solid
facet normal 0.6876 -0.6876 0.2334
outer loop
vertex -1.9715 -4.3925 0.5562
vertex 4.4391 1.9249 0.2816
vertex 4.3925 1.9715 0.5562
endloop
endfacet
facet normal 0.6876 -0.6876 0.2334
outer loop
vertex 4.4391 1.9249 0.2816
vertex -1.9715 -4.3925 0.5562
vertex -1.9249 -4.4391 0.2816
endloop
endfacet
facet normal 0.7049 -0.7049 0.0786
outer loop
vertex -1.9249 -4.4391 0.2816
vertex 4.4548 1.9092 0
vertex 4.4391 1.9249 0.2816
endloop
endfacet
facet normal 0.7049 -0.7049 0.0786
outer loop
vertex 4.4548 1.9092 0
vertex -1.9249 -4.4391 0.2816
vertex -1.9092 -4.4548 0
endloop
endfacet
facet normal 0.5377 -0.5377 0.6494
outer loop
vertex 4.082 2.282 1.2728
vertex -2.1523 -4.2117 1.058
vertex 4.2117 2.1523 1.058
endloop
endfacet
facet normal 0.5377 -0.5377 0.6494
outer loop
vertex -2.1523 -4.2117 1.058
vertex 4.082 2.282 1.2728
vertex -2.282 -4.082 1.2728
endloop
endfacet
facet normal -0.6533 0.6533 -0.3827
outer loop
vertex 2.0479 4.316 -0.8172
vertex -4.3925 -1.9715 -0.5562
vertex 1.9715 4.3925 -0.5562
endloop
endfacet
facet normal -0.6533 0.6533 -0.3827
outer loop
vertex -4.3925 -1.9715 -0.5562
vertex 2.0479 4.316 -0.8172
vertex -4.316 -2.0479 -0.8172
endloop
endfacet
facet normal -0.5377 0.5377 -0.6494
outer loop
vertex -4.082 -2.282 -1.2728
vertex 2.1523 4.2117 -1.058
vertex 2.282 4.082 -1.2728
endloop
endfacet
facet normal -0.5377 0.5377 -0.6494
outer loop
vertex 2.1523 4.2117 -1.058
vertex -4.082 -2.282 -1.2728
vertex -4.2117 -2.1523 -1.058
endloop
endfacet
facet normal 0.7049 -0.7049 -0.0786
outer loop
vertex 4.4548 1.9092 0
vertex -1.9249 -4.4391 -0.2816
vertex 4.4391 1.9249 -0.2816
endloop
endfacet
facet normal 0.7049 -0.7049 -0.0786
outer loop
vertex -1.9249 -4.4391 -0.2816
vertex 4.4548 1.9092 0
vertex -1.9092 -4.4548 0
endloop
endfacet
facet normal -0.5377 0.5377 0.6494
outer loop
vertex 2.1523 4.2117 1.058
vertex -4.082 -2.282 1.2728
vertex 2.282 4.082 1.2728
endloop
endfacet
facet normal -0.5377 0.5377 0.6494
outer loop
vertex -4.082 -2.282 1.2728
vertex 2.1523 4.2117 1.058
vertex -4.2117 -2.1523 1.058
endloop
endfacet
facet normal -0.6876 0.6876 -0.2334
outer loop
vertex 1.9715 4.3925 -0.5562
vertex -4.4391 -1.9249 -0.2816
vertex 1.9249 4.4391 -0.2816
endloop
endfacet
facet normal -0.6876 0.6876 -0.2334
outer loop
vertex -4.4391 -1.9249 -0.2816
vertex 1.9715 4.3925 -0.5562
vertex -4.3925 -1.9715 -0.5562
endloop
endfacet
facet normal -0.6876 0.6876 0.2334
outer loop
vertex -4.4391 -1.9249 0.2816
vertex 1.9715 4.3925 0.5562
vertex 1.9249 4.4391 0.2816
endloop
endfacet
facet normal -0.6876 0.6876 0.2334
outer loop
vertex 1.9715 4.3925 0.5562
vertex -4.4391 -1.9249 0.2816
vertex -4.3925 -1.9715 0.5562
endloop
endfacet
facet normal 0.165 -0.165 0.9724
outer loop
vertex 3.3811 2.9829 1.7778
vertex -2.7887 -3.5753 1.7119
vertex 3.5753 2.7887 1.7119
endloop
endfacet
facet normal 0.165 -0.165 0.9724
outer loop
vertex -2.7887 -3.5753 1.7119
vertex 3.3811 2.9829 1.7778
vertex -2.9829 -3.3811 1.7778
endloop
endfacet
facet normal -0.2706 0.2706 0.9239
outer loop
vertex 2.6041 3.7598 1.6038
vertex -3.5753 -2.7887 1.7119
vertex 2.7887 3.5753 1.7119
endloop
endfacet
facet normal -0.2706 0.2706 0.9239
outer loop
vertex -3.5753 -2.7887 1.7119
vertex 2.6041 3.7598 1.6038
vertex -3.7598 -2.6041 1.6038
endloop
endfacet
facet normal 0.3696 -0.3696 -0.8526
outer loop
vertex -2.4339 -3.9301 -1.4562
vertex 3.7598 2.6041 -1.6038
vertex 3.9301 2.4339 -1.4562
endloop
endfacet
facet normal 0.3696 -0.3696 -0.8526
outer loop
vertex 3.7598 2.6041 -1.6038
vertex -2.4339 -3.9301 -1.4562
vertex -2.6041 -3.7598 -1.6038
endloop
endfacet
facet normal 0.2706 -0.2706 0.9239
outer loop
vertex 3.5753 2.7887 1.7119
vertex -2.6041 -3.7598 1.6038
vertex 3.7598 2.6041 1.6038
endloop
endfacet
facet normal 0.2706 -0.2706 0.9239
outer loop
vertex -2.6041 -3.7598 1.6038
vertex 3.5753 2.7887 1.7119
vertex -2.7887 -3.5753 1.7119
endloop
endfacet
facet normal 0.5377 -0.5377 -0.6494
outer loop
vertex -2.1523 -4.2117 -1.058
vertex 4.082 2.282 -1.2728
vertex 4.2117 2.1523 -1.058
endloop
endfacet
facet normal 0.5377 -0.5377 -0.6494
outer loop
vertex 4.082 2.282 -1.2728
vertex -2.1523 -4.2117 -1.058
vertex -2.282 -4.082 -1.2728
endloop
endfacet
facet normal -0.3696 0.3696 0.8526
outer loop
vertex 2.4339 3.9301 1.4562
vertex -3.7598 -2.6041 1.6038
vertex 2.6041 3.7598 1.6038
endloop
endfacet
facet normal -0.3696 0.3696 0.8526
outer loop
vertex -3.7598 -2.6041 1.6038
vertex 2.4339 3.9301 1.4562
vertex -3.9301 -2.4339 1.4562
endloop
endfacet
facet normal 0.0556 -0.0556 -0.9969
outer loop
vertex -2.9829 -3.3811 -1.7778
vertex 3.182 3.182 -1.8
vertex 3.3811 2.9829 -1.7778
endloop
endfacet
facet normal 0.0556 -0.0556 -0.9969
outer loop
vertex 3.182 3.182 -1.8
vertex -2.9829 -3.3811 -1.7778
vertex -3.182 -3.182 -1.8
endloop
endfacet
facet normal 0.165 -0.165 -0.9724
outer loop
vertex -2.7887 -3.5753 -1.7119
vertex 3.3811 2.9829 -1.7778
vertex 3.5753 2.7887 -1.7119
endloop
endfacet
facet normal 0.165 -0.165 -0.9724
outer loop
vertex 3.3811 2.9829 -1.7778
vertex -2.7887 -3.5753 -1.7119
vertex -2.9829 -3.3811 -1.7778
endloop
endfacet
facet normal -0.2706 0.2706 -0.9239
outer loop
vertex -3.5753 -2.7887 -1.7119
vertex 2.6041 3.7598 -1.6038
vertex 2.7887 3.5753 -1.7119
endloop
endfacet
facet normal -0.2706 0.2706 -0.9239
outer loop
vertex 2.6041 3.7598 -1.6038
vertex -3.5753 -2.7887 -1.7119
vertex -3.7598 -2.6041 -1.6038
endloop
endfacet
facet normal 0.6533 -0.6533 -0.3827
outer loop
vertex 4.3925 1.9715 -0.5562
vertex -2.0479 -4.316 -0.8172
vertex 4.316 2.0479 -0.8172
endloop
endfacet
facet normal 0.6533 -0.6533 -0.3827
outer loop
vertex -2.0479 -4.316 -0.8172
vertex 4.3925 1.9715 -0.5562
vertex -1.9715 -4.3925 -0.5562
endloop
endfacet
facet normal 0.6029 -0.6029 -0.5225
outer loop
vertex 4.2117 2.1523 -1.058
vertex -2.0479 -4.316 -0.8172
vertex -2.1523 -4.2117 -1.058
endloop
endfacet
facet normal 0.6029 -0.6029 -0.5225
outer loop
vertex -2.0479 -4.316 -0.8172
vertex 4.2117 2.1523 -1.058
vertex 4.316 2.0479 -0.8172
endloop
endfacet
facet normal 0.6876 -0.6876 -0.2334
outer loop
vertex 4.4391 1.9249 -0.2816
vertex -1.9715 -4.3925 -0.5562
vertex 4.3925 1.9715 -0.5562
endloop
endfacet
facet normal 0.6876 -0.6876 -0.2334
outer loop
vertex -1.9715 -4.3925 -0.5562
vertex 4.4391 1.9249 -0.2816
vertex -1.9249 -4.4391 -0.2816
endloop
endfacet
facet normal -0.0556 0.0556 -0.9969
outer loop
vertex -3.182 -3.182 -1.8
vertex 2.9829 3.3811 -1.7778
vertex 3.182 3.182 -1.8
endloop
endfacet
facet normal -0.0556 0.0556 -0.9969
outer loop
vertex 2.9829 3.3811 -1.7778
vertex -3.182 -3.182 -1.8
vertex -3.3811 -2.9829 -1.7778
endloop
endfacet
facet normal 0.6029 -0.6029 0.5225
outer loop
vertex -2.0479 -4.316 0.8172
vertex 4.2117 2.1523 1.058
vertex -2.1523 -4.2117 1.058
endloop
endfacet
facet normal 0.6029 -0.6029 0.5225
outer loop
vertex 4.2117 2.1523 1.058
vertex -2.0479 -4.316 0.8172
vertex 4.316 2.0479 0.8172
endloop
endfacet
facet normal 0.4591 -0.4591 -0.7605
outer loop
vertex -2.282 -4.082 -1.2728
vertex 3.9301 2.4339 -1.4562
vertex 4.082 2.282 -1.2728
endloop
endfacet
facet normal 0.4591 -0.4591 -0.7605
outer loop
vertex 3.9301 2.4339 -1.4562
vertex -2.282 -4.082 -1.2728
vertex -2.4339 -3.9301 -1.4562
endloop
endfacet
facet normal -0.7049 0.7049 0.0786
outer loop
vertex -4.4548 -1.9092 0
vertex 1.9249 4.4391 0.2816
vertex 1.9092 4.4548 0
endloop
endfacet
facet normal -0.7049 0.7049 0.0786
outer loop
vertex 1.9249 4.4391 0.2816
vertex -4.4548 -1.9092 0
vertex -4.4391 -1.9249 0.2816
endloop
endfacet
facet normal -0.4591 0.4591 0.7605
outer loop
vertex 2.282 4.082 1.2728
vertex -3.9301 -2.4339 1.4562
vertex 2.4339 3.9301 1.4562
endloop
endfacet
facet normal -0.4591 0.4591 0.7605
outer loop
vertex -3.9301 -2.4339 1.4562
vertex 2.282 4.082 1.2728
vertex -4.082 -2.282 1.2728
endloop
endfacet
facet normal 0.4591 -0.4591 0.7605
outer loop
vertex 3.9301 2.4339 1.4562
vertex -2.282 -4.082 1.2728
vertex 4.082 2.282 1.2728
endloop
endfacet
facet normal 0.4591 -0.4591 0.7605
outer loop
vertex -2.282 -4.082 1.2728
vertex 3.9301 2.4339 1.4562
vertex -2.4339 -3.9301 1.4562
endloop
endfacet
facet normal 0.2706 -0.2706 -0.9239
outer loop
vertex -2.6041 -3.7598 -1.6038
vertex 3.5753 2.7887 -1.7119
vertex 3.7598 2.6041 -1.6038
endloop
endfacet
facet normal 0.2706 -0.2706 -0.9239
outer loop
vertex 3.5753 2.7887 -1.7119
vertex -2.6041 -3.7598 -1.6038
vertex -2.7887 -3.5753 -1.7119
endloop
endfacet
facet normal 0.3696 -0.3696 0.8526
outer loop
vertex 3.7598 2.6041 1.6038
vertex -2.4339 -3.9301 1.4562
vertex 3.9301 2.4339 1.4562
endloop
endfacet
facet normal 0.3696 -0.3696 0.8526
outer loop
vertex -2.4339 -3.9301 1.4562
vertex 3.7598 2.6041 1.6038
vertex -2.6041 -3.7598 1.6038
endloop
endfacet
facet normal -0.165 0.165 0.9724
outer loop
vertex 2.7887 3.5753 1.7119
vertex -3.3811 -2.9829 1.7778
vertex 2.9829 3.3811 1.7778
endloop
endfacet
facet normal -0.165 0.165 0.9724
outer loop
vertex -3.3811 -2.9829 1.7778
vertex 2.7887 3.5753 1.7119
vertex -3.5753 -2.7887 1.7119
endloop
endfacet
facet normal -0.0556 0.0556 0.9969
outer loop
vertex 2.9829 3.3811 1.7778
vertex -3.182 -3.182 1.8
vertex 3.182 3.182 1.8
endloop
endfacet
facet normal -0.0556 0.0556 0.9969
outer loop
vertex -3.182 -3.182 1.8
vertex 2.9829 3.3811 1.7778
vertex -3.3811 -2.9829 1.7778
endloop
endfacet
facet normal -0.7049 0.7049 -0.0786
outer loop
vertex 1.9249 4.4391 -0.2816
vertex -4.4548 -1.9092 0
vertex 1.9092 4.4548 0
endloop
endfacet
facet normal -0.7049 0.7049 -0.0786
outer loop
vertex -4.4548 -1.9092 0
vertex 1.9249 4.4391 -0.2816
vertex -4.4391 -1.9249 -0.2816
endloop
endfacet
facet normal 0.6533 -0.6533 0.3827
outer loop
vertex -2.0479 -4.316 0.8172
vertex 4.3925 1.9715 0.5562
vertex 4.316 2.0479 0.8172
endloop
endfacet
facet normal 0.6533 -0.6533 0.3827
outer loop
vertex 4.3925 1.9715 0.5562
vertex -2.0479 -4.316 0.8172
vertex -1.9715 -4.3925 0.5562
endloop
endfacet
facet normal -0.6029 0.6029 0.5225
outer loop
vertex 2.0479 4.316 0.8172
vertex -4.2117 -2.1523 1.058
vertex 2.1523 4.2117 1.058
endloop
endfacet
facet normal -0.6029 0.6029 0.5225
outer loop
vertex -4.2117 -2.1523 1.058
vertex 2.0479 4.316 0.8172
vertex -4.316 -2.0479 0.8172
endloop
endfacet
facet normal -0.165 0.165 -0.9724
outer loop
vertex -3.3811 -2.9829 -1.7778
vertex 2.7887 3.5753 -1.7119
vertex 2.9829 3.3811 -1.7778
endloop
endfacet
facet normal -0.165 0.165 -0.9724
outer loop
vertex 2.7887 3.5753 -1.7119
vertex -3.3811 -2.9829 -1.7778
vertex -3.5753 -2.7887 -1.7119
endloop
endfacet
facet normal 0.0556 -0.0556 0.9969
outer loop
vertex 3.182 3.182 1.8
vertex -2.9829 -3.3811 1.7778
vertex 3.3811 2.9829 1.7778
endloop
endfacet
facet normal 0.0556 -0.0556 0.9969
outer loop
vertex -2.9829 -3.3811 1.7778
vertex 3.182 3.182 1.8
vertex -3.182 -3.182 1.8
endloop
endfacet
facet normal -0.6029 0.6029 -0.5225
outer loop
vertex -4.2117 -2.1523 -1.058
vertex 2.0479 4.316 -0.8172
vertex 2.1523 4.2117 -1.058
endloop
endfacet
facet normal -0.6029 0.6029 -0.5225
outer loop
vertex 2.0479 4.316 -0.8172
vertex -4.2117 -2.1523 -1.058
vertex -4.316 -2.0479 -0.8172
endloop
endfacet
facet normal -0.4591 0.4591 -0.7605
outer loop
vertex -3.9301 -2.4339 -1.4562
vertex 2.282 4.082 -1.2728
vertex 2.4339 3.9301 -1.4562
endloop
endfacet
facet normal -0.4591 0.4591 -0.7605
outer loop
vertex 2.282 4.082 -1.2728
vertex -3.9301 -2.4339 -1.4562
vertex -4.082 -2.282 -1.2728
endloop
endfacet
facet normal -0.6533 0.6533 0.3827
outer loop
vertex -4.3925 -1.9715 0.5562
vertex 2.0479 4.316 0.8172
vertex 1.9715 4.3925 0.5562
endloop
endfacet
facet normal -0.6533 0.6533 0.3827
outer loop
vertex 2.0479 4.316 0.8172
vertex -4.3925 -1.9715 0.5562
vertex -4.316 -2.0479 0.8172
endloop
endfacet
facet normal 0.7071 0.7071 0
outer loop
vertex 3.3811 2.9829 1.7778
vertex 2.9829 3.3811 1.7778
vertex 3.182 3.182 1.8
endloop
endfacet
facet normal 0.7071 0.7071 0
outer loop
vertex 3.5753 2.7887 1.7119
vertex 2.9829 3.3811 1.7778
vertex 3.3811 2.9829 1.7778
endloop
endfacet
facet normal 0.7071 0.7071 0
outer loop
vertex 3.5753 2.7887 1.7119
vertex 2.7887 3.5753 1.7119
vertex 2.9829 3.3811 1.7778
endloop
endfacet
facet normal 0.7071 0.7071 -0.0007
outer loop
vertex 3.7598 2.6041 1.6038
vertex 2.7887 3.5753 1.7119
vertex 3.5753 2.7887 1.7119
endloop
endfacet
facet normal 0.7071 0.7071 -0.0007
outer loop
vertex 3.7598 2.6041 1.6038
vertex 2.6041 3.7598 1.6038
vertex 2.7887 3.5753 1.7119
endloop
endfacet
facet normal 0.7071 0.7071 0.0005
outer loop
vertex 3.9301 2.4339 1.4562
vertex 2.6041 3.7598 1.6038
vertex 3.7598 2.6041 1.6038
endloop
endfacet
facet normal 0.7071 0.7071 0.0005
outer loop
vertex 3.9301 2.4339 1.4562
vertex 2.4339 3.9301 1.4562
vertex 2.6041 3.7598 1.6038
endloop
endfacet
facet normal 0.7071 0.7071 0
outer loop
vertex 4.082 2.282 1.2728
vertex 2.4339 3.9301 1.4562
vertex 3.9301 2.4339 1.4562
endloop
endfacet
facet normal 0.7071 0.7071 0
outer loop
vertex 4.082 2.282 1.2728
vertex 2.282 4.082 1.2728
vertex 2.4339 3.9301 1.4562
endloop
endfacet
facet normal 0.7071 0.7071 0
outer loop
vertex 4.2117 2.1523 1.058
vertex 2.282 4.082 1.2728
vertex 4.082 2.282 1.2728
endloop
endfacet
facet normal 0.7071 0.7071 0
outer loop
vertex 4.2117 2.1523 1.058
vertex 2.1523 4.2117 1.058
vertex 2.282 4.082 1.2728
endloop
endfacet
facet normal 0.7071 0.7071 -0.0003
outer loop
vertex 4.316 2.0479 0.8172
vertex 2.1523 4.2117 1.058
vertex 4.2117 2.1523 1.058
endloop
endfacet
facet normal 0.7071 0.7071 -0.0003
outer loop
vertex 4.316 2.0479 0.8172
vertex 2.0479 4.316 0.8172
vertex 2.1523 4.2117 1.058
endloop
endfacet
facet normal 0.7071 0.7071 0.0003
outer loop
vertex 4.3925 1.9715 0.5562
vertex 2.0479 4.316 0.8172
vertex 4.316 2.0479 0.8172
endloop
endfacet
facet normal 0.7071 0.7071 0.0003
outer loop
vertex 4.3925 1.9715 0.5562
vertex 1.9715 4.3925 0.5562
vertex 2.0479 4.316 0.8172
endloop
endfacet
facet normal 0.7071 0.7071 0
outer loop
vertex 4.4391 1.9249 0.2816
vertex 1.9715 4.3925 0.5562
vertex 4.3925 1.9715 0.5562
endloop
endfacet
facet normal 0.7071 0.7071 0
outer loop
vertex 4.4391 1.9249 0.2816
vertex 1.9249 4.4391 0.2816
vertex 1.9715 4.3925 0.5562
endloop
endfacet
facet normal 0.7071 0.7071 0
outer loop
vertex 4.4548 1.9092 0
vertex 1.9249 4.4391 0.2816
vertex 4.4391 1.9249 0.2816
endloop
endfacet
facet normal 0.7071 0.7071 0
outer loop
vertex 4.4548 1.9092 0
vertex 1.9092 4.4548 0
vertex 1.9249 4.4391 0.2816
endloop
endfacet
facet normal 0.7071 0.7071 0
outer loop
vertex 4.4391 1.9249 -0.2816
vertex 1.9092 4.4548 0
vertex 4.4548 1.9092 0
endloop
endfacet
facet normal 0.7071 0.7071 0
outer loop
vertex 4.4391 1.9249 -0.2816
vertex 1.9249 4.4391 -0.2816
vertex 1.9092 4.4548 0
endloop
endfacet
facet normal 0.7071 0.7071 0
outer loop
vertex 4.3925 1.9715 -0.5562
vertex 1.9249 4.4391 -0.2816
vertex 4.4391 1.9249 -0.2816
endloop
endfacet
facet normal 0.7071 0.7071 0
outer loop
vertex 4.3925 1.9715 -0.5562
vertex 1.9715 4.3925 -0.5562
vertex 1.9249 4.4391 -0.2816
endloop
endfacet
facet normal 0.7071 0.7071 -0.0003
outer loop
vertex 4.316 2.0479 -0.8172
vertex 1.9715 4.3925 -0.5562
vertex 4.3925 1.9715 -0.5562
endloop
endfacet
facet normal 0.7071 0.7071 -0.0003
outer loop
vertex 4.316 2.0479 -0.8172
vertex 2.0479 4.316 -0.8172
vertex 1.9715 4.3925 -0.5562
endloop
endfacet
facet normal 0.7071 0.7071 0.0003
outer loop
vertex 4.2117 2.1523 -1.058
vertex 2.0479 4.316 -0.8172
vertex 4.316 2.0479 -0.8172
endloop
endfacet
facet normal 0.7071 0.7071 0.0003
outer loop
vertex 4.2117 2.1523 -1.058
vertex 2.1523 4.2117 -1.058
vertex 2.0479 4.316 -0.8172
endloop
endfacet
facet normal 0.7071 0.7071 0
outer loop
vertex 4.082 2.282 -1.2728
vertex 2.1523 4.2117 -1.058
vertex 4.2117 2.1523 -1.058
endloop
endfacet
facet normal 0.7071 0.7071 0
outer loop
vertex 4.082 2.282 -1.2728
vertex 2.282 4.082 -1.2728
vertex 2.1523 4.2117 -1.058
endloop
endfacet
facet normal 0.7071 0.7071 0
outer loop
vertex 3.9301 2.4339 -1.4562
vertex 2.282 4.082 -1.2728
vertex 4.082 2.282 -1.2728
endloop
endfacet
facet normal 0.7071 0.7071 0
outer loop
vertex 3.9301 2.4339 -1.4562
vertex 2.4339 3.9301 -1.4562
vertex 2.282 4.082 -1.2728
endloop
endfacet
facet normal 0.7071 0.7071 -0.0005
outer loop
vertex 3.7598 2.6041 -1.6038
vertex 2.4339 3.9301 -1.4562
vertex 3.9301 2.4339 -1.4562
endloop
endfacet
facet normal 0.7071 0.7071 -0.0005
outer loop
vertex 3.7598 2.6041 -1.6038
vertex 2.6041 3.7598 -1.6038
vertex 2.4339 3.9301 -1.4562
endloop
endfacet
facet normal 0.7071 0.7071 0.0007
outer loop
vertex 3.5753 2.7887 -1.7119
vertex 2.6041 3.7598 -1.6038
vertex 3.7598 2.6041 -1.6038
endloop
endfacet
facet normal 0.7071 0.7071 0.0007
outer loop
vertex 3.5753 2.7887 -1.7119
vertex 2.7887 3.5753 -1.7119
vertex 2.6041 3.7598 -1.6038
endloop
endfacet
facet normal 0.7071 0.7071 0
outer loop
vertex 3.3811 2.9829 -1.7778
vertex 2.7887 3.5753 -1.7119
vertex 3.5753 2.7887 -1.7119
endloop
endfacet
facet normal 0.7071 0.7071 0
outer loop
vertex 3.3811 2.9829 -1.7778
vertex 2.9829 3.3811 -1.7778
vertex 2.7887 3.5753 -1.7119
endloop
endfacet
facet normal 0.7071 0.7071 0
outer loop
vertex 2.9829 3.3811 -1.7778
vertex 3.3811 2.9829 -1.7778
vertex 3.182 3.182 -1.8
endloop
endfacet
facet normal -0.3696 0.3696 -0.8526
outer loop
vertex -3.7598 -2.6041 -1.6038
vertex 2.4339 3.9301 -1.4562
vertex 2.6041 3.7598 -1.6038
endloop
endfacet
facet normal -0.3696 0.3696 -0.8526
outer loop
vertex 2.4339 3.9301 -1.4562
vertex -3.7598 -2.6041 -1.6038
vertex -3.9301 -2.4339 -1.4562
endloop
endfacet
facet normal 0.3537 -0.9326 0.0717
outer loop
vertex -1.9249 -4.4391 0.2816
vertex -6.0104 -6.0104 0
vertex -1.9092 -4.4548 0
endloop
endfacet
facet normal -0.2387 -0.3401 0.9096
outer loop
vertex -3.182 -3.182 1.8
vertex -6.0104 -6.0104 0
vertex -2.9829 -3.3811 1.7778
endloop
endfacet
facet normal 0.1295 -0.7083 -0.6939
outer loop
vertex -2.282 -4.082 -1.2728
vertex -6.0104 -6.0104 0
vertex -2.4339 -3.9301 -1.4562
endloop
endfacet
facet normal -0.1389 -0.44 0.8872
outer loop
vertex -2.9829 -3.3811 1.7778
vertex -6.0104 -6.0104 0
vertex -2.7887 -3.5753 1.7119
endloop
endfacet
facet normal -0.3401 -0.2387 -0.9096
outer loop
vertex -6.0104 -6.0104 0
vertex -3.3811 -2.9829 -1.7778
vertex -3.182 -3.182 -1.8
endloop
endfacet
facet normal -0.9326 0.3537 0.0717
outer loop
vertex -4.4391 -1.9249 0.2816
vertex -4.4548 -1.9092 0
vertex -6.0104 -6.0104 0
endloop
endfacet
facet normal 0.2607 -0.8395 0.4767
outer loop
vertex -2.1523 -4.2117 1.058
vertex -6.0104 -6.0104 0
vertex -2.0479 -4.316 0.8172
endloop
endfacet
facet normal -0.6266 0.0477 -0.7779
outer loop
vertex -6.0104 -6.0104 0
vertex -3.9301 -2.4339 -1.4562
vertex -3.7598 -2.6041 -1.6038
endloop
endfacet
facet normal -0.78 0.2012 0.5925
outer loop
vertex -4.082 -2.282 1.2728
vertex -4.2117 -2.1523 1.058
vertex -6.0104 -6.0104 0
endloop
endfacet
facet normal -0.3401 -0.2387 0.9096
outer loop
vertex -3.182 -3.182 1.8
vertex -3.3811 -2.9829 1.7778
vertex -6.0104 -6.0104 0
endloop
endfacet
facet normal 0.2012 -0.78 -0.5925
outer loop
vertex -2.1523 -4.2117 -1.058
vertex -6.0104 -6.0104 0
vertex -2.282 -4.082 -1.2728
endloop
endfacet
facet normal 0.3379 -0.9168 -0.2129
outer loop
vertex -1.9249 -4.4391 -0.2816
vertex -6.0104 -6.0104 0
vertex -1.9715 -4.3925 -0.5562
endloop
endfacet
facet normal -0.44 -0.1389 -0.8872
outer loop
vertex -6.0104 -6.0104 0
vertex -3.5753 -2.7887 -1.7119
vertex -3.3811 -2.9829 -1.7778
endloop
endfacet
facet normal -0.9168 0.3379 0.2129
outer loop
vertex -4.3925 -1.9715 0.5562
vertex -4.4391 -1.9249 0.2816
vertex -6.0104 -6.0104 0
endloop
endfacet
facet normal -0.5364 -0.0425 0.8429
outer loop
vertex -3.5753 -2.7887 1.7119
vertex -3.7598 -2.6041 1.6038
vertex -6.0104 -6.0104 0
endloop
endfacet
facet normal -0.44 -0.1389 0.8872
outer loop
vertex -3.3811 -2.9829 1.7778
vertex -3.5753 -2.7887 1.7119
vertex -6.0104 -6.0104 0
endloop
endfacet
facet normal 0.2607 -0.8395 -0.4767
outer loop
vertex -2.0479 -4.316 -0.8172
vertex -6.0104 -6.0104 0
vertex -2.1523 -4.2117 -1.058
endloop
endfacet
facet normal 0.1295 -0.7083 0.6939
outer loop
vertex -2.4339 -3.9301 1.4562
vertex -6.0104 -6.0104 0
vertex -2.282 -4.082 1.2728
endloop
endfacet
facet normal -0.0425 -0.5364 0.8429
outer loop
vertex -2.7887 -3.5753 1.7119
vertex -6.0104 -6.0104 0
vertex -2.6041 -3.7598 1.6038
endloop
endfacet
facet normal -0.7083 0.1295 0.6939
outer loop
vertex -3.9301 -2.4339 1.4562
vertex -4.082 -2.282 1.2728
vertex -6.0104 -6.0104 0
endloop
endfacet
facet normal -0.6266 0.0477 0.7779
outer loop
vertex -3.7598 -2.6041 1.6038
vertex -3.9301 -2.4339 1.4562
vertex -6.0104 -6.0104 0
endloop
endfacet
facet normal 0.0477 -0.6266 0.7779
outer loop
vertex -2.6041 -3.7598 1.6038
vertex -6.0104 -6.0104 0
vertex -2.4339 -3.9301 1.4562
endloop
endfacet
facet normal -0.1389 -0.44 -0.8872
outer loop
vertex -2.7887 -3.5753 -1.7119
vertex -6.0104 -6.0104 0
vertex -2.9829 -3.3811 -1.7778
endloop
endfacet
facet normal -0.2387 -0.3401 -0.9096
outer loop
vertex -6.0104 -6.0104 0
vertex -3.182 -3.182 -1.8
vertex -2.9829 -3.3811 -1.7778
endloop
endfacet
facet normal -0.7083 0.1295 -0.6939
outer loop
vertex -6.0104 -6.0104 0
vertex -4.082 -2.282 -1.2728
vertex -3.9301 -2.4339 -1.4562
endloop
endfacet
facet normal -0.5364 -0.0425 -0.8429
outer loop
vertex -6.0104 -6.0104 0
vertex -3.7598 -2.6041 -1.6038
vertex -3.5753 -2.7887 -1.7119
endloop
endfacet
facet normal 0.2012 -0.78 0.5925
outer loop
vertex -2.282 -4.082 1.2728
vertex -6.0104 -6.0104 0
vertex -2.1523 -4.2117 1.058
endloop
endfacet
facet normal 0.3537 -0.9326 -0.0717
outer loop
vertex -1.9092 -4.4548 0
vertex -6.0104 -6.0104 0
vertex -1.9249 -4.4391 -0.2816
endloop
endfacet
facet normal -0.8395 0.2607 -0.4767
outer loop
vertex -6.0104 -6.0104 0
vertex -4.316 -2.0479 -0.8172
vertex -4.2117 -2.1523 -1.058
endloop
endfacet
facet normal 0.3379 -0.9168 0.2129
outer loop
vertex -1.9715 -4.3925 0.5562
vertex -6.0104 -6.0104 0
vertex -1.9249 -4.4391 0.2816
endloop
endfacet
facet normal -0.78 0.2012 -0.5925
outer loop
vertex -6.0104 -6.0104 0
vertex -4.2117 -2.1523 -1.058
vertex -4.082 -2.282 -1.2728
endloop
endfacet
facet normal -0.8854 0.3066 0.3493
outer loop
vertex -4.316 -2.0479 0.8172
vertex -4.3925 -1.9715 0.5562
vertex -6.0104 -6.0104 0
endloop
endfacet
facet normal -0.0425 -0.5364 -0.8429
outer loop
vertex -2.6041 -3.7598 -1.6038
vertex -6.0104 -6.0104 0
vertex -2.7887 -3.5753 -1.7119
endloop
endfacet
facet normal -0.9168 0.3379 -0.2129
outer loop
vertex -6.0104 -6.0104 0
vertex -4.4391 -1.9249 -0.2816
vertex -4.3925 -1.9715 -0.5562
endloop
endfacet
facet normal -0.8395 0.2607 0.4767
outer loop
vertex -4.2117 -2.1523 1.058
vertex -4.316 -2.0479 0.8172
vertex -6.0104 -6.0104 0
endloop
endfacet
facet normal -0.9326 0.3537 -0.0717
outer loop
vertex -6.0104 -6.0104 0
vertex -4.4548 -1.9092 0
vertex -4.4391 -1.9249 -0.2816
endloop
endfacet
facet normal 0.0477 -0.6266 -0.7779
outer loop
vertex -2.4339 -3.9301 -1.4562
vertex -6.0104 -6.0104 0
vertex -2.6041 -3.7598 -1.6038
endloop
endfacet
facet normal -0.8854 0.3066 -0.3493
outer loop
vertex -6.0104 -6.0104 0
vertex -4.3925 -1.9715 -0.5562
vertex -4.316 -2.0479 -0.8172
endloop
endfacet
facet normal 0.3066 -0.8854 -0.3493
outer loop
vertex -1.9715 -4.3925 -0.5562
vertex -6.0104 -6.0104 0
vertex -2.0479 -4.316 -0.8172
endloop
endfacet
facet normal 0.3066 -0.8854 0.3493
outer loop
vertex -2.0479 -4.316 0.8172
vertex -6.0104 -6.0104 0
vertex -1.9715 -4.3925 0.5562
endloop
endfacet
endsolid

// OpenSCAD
//=============================================================================
// Pencil added to an icon to show it is used for editing.
// =============================================================================

module Pencil() {
  rotate([90, 0, -45]) union() {
    radius    = 1.8;
    cylHeight = 9;
    coneHeight = 4;
    cylinder(r = radius, h = cylHeight, center = true);
    translate([0, 0, (cylHeight + coneHeight) / 2])
      cylinder(r1 = radius, r2 = 0, h = coneHeight, center = true);
  }
}

$fn = 40;
Pencil();
